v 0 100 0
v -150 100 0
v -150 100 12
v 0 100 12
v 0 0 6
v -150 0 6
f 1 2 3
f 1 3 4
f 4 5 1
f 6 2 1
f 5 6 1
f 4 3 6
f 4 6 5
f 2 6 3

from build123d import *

# Parameters (mm, degrees)
F0_W     = 150
F0_H     = 100
F1_DEPTH = 12
F2_SIZE2 = 99.99999
F2_SIZE  = 5.99999


# Not quite as in the source:
# - a fillet or chamfer is up to 0.001 mm smaller than in the source, because OpenCascade refuses the exact size


with BuildPart() as f1:
    # F0 (on Top) → F1 (new body)
    with BuildSketch(Plane.XY):
        with Locations((-75, 50)):
            Rectangle(F0_W, F0_H)
    extrude(amount=F1_DEPTH)

    # F2 (size 6 and 100 in the source; OpenCascade refuses exactly that, so slightly less here)
    f2_edges = [f1.edges().sort_by_distance(p)[0] for p in [
        (-75, 0, 12),
        (-75, 0, 0),
    ]]
    f2_side = f1.faces().sort_by_distance((-75, 0, 6))[0]
    chamfer(f2_edges, length=F2_SIZE, length2=F2_SIZE2, reference=f2_side)


solid = f1.part
